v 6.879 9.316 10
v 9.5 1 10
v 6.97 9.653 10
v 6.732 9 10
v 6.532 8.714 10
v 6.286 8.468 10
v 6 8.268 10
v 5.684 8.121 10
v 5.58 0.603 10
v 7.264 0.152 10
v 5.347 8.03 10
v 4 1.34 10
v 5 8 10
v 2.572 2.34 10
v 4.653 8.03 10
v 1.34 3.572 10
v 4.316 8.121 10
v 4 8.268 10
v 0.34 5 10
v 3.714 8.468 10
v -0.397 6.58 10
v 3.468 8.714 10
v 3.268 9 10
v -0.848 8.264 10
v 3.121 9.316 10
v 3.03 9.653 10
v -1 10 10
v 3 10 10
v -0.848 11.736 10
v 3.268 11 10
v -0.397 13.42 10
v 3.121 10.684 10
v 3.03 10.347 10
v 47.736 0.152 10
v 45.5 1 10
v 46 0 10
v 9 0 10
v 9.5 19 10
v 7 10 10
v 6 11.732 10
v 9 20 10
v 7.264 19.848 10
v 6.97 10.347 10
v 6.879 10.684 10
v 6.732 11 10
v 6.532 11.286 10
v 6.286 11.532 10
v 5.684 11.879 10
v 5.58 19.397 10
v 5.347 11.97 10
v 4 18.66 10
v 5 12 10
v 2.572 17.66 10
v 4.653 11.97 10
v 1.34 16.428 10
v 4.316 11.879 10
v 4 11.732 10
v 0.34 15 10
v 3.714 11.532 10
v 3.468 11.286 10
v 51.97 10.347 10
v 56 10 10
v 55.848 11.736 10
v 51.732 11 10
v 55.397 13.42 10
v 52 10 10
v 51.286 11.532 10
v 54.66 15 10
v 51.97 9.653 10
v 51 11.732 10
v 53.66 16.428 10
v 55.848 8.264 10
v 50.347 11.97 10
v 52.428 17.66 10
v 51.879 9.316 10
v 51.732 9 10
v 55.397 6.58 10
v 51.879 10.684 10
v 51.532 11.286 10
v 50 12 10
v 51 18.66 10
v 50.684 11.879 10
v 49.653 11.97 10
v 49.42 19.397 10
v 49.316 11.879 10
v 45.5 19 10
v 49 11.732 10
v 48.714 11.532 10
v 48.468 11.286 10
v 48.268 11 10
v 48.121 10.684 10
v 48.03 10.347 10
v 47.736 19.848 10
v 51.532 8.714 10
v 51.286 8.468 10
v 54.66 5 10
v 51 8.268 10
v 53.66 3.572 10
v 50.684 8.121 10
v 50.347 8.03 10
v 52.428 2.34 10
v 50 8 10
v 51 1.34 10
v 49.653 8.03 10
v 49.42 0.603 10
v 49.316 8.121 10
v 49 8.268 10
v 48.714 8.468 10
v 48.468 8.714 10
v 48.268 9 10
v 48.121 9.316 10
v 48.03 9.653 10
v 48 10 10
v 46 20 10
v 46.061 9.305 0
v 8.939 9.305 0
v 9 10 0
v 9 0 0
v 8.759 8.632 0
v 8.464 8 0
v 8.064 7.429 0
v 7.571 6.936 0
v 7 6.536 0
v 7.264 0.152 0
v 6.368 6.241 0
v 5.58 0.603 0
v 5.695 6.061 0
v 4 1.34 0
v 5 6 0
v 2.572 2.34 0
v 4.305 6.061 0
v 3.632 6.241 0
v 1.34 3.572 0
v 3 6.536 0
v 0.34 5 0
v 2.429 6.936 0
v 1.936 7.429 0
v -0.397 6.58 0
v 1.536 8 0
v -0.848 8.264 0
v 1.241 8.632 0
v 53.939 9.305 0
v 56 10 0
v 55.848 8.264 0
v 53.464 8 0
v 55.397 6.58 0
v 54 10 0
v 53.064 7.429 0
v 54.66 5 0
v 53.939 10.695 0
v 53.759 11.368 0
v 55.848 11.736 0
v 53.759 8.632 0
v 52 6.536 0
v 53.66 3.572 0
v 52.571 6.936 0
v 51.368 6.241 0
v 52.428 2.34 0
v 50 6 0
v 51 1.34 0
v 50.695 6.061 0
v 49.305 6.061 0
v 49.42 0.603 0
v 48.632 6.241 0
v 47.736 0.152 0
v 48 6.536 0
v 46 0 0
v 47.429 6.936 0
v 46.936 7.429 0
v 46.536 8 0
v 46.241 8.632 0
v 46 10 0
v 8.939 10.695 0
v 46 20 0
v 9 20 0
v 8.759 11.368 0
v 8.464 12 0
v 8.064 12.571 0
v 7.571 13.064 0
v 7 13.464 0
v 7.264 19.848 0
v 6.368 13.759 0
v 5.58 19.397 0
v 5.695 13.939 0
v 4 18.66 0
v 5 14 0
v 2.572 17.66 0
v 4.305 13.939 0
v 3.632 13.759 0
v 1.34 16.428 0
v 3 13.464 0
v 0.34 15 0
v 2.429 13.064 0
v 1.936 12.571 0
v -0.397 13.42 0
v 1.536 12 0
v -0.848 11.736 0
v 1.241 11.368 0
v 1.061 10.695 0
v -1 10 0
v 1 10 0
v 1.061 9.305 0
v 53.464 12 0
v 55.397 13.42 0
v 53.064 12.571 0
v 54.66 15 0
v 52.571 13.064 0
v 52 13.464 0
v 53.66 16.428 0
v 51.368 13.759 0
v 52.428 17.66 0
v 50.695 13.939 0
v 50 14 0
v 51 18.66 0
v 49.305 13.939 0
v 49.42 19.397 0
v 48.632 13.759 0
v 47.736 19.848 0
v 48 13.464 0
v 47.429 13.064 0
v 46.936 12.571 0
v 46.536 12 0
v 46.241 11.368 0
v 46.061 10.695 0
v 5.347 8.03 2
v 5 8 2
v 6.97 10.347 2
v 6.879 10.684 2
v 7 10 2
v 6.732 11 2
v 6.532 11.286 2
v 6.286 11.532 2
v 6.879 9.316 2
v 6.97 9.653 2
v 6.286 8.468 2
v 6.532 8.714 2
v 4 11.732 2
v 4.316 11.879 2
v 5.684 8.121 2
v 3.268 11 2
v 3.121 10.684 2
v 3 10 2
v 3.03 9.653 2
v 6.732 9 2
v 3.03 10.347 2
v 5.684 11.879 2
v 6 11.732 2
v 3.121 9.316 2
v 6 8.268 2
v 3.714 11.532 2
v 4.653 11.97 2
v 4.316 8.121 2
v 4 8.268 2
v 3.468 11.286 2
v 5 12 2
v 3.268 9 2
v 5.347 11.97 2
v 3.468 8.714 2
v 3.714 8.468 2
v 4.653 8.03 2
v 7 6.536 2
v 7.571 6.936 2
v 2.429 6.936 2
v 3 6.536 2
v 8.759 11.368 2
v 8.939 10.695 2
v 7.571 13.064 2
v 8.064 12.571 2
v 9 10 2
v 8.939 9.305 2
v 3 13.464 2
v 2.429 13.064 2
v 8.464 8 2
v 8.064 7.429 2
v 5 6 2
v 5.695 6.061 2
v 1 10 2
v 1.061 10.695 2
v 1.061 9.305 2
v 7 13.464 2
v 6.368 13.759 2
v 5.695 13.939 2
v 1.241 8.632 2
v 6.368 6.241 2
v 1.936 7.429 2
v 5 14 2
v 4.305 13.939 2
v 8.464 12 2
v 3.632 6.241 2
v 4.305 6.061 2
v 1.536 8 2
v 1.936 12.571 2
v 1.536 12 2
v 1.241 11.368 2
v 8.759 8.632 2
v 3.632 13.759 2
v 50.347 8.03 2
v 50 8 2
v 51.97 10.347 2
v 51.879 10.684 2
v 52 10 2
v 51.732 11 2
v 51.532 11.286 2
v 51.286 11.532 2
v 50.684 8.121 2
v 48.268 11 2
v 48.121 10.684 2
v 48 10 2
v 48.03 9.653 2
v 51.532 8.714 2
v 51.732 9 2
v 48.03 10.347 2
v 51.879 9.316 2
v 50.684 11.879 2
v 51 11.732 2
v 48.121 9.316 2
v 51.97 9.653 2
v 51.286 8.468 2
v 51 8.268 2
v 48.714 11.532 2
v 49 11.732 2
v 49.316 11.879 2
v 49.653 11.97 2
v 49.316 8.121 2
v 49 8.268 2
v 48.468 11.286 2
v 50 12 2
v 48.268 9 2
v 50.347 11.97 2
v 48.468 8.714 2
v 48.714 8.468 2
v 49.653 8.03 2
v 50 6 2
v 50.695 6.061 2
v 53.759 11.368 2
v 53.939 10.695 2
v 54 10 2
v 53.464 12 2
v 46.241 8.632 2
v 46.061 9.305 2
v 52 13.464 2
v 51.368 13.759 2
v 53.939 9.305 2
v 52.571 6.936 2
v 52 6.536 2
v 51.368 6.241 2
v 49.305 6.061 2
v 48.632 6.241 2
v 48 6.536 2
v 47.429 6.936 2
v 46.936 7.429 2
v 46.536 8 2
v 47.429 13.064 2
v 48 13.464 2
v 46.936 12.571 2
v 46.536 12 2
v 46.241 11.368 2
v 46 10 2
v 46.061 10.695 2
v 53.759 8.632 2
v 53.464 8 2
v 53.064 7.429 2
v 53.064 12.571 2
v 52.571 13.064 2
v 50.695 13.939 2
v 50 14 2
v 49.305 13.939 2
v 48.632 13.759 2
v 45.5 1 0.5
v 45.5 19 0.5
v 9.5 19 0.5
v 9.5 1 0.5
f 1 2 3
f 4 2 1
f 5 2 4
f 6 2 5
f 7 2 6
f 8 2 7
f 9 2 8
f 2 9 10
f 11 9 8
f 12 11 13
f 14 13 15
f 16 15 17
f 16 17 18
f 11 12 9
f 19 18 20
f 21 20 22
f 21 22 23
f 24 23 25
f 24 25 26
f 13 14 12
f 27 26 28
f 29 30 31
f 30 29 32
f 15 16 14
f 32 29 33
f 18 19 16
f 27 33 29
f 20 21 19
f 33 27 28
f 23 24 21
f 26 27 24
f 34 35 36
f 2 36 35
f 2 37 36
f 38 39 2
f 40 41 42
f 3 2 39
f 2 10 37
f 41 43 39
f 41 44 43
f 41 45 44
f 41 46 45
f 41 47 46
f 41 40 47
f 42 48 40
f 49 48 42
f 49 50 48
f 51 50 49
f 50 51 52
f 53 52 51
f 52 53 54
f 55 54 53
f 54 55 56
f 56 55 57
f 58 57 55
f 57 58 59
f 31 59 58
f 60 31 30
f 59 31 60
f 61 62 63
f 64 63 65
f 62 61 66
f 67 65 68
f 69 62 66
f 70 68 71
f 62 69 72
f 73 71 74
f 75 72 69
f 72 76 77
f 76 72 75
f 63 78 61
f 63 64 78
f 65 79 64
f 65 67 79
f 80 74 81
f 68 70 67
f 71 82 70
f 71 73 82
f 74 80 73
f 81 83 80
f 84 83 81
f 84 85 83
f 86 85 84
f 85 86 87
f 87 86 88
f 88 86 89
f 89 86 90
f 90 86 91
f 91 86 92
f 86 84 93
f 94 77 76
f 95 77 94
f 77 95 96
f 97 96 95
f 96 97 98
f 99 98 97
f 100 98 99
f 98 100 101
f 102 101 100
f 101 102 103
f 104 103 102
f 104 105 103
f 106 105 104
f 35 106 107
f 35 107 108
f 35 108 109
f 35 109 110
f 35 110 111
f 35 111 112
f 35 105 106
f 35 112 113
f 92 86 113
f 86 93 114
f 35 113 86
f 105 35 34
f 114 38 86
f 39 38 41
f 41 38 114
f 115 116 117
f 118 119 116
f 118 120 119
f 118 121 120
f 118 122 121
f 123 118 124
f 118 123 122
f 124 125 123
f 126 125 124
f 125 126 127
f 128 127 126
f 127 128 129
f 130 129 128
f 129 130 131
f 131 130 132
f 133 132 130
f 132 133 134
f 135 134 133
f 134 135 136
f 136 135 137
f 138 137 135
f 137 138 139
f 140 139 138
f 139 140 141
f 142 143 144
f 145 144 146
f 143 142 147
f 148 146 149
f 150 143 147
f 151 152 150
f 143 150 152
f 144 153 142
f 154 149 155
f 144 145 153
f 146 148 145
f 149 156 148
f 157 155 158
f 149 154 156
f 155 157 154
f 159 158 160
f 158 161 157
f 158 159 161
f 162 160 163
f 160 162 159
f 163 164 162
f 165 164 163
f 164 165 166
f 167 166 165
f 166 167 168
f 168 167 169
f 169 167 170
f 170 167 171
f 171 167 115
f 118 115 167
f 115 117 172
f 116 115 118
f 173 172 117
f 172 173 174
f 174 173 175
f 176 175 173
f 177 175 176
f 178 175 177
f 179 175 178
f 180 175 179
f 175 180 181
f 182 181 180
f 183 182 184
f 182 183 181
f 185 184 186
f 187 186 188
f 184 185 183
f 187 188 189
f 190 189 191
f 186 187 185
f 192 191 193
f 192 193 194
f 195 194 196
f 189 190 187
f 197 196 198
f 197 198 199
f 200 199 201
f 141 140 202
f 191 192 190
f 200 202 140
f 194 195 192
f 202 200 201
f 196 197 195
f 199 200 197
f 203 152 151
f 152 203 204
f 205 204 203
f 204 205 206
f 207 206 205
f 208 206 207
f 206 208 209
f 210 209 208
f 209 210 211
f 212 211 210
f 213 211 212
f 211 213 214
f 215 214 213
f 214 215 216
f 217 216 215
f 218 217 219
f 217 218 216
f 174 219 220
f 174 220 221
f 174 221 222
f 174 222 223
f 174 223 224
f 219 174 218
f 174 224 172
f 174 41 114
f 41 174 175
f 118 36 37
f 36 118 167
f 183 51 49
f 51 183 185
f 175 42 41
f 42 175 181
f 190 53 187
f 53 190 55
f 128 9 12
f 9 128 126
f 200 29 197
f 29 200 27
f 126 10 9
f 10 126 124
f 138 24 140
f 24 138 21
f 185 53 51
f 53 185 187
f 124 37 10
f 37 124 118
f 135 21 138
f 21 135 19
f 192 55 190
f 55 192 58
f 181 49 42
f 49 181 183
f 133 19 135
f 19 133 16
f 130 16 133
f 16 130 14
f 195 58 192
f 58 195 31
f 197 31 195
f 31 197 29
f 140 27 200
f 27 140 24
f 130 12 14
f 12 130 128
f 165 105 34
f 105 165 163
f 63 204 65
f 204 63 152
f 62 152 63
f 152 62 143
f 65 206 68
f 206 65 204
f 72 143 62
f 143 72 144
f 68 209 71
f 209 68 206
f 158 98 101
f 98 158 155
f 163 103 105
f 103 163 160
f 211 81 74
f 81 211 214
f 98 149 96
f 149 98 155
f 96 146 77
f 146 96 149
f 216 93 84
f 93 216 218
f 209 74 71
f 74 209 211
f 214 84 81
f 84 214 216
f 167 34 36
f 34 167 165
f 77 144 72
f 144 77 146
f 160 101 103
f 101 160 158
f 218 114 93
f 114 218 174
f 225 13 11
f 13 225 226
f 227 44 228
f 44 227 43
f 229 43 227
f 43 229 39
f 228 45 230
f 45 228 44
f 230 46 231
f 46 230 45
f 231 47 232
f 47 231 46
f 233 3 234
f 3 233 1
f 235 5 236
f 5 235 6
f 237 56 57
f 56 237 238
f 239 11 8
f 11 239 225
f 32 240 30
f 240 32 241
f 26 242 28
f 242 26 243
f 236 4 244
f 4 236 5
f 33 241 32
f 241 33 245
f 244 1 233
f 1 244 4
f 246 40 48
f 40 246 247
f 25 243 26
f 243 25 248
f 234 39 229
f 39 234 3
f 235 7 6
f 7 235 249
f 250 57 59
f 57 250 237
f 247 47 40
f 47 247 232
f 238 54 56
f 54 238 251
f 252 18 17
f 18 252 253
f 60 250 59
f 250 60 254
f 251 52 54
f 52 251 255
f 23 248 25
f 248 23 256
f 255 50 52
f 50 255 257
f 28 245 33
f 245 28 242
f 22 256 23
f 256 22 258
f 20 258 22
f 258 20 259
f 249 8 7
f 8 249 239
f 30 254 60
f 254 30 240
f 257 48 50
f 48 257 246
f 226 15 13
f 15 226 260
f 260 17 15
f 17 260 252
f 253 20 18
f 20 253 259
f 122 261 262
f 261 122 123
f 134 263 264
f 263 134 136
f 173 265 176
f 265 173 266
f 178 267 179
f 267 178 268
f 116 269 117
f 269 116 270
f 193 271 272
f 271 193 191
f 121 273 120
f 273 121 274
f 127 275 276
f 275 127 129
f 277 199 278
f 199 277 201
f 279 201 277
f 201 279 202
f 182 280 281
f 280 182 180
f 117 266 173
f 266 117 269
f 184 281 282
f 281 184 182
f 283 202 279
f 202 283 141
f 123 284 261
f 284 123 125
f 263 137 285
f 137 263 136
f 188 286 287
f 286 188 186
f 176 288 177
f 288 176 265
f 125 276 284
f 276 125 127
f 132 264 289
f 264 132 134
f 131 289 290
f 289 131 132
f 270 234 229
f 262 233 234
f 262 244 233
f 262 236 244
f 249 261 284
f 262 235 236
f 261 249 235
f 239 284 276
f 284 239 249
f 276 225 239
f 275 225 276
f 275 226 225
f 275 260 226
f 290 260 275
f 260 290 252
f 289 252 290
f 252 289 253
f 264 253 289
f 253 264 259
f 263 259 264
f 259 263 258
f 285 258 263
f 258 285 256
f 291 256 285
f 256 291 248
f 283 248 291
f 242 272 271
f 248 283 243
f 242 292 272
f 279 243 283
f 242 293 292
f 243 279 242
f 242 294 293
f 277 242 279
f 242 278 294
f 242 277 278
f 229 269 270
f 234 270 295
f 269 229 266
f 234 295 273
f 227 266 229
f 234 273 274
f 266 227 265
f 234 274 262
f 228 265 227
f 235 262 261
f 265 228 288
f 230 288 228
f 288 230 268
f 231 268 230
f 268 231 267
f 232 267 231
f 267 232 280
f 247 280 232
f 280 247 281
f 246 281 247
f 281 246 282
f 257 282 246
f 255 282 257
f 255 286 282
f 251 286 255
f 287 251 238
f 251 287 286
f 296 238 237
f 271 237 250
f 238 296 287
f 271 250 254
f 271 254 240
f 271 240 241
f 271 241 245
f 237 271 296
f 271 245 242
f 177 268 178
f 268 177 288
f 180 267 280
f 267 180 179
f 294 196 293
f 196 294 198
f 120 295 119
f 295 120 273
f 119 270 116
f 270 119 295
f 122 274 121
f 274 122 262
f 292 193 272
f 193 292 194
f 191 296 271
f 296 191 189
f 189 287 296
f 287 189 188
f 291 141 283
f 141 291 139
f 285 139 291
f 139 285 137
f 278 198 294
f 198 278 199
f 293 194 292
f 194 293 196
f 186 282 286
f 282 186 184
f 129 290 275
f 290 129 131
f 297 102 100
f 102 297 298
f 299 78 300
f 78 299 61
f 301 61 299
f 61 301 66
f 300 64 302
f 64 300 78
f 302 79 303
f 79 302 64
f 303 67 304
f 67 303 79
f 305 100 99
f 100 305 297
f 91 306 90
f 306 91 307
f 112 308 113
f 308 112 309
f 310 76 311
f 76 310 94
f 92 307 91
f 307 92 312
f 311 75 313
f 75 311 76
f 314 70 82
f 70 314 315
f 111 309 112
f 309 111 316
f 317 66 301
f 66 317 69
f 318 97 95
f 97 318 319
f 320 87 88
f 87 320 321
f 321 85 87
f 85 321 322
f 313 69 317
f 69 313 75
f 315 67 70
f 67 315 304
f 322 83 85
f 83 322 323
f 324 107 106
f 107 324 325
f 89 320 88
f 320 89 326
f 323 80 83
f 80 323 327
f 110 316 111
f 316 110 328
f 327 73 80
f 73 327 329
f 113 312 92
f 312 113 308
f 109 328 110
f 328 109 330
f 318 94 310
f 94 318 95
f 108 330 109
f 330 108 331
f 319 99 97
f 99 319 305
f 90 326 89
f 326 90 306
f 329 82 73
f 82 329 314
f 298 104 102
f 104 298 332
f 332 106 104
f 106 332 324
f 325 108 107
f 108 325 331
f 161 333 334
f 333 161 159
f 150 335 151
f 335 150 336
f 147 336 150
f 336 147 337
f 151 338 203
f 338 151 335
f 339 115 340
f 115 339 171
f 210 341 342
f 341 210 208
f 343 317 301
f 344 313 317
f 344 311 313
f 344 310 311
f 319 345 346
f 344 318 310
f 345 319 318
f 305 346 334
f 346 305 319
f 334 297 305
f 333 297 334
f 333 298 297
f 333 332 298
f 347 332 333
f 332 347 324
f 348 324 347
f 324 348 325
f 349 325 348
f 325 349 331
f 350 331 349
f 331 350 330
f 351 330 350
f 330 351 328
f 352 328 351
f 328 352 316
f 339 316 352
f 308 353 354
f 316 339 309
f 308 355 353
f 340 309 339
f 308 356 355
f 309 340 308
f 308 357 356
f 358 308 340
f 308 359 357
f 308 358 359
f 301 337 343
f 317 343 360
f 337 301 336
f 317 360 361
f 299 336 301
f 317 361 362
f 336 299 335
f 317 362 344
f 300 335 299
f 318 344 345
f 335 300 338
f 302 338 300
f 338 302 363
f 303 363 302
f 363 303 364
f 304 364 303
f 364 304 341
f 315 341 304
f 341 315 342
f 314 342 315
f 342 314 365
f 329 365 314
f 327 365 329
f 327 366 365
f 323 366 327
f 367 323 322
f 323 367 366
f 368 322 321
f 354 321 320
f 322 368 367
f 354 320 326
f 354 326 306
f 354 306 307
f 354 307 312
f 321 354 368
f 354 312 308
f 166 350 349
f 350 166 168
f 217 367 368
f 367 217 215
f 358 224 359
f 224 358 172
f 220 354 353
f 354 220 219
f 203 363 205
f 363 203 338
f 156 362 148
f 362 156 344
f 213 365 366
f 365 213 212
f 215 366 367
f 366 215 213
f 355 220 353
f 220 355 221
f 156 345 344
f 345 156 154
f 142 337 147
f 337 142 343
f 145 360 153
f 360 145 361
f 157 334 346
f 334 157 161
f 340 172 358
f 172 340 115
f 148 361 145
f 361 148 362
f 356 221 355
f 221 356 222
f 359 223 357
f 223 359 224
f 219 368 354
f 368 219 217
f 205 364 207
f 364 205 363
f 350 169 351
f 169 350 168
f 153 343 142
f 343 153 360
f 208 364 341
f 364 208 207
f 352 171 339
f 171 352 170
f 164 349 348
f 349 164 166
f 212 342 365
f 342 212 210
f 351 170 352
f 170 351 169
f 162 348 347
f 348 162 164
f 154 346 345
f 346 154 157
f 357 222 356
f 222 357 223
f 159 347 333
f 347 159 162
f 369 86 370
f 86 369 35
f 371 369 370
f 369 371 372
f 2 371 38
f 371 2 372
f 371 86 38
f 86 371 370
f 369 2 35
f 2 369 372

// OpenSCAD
$fn=36;

difference(){
    union(){
        translate([9,0,0]){
            cube([37,20,10]);
        }
        translate([9,10,0]){
            cylinder(10,10,10);
        }
        translate([46,10,0]){
            cylinder(10,10,10);
        }
    }
    //cube([55,20,10]);
    translate([9.5,1,0.5]){
        cube([36,18,9.5]);
    }
    translate([5,10,0]){
        cylinder(10,2,2);
        cylinder(2,4,4);
    }
    
    translate([50,10,0]){
        cylinder(10,2,2);
        cylinder(2,4,4);
    }
}
